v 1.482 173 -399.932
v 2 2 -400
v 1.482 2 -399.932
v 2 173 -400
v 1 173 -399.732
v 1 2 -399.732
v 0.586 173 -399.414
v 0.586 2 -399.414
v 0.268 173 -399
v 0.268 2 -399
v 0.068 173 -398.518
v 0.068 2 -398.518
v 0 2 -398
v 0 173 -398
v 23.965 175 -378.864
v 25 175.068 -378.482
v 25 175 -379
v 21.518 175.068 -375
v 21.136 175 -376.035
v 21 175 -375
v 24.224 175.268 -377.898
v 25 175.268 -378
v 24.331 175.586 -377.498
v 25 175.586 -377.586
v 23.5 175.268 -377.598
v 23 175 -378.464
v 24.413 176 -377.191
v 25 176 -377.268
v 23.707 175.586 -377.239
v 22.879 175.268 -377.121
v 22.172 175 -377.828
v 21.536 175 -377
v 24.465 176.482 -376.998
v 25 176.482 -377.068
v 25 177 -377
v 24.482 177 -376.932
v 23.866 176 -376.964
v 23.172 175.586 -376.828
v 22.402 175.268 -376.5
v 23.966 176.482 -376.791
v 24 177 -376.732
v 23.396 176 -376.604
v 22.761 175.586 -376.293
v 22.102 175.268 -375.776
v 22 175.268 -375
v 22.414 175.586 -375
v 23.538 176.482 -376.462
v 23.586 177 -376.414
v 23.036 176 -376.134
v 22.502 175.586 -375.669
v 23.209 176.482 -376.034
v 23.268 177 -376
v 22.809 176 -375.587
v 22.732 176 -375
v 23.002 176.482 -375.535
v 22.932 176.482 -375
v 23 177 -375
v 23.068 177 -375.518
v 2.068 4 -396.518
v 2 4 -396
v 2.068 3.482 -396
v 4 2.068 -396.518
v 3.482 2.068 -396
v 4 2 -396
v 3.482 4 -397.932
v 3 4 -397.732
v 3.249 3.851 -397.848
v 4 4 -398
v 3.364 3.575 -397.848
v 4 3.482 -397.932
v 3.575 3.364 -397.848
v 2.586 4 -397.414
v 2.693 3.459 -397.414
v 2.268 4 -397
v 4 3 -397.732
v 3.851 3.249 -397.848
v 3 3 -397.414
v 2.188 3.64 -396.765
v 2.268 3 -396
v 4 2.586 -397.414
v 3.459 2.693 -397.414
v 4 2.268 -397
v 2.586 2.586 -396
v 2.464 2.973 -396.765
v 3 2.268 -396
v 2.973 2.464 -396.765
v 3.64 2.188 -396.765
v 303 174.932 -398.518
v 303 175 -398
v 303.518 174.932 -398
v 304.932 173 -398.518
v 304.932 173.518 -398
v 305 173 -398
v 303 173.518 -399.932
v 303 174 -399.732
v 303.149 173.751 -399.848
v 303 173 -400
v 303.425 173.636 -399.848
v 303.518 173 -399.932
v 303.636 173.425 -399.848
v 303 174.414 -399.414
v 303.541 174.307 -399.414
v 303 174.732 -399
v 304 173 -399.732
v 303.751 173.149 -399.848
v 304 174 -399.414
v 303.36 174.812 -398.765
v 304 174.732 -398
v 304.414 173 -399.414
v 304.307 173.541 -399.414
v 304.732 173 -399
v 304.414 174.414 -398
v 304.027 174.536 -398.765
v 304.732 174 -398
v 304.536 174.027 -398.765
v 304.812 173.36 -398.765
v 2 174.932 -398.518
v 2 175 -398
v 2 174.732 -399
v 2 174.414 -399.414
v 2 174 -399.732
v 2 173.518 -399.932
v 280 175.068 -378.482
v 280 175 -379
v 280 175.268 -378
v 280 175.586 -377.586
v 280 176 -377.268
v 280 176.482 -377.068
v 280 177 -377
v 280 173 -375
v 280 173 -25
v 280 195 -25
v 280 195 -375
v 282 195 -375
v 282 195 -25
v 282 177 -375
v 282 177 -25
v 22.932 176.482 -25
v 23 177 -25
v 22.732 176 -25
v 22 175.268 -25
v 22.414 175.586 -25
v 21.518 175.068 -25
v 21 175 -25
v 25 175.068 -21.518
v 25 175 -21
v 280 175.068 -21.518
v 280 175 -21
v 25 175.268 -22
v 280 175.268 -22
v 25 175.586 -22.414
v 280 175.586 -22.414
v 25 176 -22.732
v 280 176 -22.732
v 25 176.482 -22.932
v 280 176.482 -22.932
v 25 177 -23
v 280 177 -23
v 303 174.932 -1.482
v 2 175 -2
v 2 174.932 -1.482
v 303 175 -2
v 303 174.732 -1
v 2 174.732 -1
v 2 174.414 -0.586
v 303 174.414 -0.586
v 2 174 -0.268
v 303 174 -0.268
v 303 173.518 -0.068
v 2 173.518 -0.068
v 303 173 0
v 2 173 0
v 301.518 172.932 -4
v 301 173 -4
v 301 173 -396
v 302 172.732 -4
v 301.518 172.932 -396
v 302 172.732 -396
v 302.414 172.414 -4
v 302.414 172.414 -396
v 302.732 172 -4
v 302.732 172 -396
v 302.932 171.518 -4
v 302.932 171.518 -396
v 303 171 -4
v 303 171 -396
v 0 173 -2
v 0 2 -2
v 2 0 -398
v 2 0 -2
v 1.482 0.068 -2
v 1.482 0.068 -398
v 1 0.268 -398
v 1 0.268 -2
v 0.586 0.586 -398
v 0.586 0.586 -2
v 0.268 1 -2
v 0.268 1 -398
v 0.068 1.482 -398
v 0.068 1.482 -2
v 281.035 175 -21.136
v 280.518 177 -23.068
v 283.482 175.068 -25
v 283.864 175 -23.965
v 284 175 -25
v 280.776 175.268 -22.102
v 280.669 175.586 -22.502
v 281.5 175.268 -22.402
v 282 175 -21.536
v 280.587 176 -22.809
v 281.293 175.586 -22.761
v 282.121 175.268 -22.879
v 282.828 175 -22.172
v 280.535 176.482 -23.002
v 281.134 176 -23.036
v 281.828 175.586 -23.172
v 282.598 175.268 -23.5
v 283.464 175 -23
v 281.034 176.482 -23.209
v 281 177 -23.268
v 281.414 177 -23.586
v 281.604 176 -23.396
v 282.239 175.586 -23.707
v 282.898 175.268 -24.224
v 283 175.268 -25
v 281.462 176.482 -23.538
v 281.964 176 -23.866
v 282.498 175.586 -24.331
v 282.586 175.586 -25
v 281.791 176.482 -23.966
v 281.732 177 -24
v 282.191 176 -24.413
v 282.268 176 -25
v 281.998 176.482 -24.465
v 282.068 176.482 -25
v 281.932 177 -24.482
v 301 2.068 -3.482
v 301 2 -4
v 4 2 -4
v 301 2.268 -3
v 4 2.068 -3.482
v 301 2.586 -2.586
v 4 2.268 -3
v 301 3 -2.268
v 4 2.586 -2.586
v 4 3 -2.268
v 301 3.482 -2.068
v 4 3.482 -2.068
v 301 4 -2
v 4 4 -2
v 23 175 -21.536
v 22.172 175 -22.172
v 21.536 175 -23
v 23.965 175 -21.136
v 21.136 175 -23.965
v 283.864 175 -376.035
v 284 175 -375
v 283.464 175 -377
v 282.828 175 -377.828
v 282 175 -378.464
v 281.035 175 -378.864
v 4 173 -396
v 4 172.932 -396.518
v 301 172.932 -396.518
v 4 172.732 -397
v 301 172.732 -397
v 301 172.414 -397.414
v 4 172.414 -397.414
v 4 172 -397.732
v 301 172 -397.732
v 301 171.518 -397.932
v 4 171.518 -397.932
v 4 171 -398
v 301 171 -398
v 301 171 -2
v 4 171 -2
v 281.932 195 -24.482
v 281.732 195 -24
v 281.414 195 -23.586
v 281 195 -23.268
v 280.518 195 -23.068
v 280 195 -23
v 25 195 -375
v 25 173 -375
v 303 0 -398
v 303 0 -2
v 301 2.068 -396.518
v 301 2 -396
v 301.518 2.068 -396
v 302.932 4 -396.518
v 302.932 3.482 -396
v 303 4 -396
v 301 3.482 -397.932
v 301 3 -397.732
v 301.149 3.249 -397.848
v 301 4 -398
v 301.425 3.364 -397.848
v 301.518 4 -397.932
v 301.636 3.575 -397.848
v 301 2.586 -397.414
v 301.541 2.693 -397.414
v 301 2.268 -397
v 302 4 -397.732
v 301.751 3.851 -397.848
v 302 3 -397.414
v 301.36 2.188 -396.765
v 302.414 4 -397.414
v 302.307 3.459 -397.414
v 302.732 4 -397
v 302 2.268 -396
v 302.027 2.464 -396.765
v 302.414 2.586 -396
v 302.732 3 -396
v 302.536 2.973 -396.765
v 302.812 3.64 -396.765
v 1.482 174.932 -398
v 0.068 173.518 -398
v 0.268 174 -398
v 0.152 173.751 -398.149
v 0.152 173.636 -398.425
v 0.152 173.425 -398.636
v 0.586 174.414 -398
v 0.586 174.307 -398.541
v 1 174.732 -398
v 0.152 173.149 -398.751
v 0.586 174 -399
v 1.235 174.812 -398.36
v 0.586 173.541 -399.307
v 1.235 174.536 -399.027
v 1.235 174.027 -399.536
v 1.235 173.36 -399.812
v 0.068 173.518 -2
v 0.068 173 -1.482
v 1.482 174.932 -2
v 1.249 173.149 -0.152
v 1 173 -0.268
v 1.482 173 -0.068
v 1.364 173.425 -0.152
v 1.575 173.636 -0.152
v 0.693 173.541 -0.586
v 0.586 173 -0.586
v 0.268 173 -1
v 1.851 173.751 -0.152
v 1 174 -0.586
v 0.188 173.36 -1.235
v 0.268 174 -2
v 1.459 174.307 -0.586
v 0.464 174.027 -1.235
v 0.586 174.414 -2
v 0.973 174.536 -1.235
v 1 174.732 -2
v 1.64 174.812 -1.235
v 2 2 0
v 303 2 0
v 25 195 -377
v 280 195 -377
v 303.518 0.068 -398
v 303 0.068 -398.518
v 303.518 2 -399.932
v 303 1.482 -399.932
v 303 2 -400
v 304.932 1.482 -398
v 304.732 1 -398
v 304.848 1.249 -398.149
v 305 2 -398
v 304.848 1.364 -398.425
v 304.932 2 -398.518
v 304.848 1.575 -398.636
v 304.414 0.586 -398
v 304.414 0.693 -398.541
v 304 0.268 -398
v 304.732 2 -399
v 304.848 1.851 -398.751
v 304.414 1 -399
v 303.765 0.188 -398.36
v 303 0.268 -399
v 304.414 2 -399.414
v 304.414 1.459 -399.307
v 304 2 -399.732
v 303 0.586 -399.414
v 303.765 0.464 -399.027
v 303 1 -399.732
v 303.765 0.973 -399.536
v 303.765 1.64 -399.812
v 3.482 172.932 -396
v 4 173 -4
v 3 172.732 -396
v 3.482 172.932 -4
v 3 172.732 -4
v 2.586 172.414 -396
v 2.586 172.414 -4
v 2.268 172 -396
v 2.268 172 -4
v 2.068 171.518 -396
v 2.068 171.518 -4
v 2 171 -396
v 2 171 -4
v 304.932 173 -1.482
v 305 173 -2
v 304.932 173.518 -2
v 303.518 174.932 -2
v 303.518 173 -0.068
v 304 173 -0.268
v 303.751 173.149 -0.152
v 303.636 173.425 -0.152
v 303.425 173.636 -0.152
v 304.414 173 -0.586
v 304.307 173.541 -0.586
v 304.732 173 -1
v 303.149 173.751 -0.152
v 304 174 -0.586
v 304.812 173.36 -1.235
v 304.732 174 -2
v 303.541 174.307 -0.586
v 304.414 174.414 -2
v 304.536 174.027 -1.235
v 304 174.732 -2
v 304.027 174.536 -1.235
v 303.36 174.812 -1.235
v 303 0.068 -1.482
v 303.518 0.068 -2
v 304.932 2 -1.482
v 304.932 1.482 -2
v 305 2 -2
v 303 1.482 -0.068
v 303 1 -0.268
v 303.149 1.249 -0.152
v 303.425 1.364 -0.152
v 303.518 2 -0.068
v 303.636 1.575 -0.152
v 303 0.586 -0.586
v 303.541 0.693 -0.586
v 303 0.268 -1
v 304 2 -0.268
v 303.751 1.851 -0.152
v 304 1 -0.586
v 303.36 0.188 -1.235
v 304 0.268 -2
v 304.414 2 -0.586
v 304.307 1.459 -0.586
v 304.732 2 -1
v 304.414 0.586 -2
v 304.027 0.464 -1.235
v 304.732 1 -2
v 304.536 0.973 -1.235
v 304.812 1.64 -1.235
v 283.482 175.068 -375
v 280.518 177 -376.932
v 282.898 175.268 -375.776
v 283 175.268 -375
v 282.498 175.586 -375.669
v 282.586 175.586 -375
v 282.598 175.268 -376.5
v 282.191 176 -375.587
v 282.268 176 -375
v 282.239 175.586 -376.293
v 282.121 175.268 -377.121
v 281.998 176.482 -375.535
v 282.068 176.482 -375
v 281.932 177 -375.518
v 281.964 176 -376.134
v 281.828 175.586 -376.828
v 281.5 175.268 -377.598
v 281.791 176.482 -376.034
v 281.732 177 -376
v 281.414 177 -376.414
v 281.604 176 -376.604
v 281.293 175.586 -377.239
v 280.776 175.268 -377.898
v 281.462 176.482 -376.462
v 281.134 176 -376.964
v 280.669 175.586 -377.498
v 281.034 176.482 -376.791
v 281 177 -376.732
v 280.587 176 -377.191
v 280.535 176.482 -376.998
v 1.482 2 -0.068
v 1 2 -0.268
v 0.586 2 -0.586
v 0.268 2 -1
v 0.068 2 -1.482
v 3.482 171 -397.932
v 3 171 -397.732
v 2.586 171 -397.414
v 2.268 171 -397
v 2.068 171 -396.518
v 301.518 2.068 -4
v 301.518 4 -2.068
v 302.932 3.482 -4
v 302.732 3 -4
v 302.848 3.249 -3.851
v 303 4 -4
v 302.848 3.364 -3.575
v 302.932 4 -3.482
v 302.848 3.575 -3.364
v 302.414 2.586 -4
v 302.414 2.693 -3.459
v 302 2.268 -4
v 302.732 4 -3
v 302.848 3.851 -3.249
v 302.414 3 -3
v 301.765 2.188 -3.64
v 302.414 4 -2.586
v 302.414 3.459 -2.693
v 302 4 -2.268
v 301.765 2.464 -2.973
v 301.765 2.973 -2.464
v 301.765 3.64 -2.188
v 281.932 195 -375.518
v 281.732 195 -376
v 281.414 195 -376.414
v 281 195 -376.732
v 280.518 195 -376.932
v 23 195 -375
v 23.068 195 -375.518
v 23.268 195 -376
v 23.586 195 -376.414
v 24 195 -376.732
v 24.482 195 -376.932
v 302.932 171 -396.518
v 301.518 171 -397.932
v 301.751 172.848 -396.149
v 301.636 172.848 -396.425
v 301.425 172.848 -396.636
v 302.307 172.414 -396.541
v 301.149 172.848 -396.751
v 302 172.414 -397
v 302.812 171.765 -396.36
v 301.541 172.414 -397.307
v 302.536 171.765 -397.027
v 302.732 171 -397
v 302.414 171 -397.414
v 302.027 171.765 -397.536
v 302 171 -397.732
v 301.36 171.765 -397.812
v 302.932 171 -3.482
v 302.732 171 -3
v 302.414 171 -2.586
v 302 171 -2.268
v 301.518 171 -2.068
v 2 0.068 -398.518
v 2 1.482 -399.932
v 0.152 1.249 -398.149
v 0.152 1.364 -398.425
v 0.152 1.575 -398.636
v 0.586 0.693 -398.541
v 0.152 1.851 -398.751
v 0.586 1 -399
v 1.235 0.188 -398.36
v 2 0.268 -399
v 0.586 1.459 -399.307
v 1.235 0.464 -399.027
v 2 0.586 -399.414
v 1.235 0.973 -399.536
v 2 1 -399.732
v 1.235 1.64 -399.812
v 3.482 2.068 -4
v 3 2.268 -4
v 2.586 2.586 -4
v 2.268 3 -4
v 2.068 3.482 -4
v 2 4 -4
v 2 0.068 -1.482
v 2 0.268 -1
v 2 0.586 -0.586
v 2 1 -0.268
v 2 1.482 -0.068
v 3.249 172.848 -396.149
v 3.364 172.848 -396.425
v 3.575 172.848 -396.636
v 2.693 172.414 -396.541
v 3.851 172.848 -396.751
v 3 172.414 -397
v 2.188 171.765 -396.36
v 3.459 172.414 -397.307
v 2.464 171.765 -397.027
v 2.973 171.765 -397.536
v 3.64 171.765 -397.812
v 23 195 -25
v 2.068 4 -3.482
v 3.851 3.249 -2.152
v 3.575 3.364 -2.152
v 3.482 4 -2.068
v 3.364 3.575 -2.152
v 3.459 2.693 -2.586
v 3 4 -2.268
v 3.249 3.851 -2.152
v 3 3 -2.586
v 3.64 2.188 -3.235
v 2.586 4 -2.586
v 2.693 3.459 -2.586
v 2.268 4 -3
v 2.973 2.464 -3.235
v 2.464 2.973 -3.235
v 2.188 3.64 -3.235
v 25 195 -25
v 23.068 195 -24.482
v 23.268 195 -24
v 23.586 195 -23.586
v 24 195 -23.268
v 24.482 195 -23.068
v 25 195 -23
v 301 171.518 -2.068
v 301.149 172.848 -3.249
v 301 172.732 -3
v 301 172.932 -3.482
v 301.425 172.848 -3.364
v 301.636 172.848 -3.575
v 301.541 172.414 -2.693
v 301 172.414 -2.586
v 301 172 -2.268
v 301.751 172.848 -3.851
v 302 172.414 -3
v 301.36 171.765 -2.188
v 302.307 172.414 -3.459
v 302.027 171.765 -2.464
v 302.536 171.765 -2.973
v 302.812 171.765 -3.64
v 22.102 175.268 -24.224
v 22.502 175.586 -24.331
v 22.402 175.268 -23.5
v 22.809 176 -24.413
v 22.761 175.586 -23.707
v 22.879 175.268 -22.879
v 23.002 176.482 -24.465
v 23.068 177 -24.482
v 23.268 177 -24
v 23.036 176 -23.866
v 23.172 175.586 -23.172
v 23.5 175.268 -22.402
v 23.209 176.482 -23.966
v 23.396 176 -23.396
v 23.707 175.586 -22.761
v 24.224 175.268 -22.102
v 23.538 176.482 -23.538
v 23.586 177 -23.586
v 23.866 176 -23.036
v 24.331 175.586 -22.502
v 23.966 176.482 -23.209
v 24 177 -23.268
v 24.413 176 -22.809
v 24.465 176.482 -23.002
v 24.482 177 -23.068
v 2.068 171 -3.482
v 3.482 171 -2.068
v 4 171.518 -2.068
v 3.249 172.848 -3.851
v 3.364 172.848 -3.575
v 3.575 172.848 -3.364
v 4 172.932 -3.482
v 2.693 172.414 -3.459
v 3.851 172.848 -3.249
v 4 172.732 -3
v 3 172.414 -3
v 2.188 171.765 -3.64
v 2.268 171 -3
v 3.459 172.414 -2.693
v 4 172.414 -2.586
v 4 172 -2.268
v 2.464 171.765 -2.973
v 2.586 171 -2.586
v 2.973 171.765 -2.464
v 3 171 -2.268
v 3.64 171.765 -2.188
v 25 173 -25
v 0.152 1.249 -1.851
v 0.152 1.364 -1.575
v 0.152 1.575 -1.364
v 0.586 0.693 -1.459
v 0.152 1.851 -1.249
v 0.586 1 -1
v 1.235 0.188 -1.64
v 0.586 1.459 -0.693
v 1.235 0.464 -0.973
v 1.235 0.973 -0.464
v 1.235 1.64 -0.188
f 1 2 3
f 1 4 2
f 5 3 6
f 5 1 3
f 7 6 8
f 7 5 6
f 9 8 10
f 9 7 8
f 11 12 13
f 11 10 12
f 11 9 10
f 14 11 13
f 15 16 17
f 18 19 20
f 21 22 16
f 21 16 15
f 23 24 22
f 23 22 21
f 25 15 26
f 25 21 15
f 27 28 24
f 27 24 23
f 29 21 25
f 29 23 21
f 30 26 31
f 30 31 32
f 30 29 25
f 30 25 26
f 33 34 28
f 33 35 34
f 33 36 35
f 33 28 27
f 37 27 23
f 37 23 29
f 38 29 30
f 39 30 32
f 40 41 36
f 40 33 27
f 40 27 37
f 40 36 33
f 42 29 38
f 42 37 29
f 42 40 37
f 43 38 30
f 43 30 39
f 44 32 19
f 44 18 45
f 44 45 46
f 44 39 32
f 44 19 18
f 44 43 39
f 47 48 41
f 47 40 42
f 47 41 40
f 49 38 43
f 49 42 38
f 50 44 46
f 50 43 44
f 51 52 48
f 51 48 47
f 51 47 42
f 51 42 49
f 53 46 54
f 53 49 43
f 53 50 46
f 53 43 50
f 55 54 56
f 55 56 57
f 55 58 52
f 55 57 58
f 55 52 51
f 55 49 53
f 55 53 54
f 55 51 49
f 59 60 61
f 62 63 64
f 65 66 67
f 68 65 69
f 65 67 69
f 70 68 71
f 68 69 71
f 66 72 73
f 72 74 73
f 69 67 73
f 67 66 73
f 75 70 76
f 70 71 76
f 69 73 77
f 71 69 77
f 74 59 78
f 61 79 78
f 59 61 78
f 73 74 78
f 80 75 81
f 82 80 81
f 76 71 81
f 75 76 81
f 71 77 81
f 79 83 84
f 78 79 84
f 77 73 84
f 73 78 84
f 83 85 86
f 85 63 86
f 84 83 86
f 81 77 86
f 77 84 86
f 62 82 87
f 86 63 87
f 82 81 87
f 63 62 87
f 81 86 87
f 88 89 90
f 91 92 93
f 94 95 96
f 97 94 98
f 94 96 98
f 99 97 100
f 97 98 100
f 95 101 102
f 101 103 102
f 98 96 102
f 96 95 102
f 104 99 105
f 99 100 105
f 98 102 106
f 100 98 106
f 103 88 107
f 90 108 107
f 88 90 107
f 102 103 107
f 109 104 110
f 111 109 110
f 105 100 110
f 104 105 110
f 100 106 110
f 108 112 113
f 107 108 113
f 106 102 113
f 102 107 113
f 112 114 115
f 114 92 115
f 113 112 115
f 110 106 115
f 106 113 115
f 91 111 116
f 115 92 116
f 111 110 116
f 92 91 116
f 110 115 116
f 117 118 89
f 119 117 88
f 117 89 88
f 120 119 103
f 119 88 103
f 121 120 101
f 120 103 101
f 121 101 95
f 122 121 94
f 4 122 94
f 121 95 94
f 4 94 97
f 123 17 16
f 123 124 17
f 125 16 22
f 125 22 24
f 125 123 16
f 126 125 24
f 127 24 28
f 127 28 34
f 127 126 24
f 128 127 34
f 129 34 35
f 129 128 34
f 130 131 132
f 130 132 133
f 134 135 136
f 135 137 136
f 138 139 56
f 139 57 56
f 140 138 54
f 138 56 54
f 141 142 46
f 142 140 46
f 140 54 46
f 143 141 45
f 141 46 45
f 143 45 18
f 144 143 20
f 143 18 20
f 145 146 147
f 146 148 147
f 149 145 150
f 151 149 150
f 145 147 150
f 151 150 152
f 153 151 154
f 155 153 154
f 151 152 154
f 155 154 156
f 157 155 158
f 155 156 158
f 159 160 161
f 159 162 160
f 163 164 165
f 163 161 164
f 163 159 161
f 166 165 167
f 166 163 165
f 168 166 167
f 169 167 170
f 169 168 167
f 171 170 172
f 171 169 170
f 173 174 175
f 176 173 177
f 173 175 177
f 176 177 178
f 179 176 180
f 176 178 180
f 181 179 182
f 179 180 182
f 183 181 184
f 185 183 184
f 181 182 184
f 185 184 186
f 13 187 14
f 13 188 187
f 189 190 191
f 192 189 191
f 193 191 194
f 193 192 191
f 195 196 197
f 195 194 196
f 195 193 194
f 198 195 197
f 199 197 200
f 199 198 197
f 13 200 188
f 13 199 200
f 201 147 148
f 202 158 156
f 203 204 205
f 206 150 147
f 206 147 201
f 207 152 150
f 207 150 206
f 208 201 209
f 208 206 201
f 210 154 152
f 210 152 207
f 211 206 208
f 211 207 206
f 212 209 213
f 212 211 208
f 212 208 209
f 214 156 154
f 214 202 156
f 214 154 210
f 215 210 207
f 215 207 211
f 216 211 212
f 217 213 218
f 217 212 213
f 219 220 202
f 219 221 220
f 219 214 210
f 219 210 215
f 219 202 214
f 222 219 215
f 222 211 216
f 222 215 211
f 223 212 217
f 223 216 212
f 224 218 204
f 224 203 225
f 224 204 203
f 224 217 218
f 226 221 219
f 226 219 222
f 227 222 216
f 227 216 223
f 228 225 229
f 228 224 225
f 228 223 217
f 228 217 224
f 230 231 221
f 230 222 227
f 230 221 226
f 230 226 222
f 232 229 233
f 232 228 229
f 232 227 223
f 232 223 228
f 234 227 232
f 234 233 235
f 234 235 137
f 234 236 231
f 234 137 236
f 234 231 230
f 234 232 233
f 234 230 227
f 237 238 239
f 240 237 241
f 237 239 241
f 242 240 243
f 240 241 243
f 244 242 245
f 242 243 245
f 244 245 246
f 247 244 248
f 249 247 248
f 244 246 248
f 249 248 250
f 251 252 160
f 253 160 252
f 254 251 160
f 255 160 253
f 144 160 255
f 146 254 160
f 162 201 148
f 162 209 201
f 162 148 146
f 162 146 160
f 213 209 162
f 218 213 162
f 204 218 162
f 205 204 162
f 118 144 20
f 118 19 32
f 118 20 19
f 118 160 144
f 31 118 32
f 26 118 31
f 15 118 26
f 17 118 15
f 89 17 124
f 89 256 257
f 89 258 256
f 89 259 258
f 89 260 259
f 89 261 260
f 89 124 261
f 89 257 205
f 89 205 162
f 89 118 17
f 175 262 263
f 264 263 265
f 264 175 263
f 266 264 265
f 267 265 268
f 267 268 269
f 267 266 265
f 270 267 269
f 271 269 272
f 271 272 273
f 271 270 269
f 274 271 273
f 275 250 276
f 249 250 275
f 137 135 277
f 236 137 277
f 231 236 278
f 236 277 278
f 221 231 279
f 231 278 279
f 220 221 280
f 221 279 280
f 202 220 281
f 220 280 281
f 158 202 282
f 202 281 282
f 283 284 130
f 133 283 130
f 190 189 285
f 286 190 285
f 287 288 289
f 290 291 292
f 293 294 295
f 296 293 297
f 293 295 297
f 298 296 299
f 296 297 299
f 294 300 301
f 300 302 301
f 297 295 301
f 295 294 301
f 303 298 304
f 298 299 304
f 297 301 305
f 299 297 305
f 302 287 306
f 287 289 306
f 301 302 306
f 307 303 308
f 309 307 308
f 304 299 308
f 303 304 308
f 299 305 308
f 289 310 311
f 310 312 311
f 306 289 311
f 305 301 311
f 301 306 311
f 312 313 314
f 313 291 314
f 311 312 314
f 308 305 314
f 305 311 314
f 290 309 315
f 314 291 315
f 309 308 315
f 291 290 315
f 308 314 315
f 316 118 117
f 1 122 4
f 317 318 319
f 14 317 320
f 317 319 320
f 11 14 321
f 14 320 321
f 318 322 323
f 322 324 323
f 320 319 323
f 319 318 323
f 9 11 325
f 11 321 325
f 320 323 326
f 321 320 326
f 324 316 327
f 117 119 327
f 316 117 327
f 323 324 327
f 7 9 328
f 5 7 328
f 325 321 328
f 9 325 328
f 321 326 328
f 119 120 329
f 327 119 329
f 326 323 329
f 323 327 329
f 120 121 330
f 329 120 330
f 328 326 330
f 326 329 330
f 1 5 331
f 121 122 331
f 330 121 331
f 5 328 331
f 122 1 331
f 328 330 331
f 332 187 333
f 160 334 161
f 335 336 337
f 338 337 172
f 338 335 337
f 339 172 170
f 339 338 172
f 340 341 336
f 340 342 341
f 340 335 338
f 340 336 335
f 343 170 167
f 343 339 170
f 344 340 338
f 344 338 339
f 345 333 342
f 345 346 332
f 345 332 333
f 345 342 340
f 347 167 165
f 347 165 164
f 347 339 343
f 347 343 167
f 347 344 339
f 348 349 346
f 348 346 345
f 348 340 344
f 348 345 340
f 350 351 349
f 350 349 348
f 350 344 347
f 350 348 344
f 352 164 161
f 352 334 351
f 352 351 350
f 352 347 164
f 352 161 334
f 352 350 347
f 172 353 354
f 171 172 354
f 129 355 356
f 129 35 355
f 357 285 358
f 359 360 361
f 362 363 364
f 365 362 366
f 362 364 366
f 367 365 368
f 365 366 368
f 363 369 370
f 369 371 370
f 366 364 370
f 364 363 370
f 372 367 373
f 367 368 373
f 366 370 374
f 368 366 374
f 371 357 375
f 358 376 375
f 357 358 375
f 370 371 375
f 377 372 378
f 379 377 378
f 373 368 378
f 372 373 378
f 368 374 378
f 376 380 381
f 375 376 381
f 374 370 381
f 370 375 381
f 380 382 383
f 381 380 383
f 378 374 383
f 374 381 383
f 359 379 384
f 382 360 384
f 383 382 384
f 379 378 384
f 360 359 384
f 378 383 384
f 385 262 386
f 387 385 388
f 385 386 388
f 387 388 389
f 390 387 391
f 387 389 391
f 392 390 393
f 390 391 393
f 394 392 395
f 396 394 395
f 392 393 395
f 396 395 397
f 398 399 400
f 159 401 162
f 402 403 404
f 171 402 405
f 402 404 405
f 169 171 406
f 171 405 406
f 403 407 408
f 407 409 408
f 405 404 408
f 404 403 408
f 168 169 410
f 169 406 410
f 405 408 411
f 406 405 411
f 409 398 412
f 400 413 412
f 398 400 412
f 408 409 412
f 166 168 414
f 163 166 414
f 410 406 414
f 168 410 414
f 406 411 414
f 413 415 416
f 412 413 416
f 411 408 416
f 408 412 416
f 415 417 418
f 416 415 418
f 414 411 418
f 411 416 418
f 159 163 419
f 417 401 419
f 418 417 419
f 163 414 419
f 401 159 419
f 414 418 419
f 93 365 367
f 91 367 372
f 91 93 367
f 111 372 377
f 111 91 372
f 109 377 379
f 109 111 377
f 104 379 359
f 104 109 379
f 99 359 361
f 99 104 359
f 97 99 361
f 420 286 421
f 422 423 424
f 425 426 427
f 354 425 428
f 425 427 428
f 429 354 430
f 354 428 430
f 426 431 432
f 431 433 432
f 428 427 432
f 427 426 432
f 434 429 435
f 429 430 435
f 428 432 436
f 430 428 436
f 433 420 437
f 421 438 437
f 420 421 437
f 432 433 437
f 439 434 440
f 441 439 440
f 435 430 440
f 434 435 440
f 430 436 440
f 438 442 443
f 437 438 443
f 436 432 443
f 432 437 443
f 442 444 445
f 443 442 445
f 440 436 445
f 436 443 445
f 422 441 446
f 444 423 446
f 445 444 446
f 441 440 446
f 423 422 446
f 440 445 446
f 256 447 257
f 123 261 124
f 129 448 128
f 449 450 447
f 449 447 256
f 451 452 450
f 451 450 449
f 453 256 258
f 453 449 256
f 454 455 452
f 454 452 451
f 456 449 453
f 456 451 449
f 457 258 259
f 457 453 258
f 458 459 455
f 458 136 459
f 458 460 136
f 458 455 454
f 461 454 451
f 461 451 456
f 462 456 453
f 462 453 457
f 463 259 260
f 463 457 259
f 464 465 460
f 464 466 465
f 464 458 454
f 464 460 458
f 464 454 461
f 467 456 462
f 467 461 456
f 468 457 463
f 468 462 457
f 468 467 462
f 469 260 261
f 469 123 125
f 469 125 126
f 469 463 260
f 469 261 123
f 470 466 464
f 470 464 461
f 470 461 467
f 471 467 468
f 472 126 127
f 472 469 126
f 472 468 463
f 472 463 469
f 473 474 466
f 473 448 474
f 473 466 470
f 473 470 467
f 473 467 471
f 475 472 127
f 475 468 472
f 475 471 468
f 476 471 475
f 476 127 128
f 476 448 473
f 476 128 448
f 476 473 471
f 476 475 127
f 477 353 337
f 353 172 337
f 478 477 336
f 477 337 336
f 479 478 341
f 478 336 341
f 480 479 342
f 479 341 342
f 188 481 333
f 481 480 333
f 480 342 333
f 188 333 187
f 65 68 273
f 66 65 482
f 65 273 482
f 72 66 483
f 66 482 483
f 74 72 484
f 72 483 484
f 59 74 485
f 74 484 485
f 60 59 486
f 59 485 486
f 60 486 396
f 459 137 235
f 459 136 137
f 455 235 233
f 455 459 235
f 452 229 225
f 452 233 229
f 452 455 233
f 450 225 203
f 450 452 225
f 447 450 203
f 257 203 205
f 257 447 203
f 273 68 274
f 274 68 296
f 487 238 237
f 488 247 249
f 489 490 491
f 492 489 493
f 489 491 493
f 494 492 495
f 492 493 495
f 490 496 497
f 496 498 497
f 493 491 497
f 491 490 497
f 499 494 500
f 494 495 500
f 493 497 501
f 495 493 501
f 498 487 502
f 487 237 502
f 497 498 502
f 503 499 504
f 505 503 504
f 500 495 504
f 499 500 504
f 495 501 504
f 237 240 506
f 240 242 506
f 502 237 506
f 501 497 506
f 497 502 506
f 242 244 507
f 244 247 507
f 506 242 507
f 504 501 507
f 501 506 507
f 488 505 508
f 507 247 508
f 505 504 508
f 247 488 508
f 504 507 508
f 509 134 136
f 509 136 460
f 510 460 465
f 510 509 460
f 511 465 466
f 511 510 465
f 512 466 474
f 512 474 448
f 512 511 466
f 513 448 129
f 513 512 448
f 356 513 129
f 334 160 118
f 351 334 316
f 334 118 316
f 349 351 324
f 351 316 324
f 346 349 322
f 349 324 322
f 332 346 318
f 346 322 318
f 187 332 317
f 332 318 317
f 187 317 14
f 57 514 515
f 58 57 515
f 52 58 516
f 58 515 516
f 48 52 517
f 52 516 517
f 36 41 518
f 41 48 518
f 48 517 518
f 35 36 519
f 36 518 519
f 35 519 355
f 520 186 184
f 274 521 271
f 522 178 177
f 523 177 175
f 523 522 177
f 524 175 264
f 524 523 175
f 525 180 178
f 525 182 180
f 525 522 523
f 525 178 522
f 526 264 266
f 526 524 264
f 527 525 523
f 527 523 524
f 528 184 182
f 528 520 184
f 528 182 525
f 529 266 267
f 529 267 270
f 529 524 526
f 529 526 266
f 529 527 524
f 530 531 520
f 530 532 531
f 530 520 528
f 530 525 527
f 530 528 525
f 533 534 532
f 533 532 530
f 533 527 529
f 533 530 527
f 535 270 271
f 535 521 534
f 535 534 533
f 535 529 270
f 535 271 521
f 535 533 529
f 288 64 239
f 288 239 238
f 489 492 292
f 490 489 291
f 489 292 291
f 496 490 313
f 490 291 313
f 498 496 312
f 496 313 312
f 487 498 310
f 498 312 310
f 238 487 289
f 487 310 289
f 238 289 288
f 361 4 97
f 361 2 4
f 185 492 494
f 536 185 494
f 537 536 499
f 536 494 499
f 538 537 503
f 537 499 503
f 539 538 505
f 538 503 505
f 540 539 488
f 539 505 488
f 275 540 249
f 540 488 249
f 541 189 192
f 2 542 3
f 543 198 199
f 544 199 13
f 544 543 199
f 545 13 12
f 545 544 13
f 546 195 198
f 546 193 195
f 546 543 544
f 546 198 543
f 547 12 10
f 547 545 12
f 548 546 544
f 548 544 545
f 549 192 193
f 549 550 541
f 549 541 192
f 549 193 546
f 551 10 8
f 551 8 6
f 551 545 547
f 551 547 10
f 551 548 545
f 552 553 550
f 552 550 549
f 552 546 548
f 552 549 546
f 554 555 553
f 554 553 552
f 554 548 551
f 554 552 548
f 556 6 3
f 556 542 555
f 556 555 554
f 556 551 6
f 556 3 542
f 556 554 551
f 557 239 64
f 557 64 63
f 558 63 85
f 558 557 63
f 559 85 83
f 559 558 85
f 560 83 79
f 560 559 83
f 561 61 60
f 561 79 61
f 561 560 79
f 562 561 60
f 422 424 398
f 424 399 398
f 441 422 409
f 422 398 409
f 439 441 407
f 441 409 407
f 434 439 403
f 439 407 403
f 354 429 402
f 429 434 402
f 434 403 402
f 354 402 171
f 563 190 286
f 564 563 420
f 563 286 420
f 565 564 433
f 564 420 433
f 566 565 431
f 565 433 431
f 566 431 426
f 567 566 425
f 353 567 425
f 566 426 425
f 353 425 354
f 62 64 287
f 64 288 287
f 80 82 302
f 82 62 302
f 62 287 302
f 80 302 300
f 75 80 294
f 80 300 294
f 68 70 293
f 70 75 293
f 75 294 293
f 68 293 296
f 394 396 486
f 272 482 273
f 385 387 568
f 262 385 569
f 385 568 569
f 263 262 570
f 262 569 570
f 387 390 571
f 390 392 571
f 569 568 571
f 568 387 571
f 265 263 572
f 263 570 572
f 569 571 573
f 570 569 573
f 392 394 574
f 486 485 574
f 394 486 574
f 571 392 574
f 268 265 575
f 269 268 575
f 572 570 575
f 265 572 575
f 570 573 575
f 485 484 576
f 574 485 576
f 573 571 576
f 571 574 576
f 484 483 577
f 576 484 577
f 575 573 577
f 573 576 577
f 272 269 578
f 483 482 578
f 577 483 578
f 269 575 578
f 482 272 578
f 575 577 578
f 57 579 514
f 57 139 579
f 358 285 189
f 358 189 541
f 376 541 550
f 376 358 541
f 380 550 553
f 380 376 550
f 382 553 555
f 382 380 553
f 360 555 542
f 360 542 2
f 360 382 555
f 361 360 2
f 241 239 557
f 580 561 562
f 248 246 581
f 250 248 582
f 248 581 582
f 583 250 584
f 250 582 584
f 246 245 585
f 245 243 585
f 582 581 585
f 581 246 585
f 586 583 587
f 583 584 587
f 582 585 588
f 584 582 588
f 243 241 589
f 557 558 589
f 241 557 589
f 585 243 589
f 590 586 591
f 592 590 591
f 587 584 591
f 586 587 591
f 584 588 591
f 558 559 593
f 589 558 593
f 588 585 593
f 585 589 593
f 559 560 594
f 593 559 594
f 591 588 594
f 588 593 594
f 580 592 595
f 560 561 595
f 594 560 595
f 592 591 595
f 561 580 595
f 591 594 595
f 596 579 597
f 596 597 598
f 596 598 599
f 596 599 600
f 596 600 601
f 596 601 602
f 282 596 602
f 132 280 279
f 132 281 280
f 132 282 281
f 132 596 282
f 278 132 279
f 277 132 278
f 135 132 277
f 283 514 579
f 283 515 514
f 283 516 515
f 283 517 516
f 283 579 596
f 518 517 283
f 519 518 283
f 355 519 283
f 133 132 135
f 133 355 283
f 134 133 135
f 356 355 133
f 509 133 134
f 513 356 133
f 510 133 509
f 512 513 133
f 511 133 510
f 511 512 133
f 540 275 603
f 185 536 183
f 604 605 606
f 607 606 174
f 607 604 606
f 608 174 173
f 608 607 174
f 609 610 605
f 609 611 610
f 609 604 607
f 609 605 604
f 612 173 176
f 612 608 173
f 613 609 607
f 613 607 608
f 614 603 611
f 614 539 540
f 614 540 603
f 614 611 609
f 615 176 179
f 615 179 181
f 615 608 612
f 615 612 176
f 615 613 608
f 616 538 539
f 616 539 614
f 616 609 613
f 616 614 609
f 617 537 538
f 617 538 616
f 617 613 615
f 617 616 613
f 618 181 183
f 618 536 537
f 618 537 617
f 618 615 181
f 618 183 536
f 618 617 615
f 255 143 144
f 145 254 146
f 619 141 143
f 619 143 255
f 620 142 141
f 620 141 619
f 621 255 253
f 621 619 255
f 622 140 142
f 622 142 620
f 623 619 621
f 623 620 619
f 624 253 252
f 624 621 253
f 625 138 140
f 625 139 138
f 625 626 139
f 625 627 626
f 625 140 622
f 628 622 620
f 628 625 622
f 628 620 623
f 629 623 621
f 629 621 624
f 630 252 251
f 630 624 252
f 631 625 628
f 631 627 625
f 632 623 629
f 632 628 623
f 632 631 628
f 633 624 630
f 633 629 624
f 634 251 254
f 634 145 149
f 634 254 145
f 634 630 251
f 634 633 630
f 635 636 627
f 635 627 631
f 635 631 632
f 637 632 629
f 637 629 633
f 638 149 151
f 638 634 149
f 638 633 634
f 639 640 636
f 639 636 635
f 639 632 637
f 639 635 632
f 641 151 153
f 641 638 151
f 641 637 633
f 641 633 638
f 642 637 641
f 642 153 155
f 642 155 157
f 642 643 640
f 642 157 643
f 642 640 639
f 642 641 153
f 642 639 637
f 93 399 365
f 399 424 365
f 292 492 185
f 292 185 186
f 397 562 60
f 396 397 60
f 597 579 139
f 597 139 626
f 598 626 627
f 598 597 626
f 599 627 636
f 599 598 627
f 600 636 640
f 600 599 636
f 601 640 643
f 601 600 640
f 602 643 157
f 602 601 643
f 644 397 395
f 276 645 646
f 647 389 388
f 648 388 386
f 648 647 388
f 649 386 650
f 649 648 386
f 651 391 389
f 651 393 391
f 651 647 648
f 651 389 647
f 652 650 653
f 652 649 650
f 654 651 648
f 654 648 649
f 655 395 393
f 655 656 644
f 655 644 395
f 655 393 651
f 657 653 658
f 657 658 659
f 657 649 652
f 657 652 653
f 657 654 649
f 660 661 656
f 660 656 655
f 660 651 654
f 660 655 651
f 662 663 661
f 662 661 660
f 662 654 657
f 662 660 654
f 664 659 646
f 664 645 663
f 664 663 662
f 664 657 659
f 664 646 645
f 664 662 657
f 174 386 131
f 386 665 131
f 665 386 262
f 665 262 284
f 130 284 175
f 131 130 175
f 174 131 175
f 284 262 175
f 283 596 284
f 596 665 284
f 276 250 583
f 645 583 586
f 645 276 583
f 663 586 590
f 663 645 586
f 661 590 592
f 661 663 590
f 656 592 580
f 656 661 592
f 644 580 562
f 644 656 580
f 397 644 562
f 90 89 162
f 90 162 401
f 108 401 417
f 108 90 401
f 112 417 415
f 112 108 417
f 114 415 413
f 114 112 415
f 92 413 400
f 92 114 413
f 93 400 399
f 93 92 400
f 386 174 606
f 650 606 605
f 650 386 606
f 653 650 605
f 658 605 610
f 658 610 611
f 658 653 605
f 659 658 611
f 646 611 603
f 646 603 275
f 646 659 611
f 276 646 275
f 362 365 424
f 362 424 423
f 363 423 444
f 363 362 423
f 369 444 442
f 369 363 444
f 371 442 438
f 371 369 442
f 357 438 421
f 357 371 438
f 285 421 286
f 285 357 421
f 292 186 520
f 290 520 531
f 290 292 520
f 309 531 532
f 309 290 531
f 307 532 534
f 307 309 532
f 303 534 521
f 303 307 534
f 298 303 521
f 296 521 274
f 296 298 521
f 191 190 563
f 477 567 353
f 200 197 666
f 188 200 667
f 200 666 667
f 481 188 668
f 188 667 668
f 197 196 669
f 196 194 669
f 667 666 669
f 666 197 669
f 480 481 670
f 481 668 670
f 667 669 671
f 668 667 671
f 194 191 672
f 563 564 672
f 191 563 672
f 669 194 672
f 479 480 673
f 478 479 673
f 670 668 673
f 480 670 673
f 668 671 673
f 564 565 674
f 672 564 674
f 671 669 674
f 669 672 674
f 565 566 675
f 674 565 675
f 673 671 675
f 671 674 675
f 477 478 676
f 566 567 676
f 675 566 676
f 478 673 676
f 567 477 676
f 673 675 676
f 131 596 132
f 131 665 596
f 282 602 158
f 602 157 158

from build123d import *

# Parameters (mm, degrees)
SKETCH1_W           = 305
SKETCH1_H           = 400
BOSS_EXTRUDE1_DEPTH = 175
SHELL1_T            = 2
SKETCH2_W           = 255
SKETCH2_H           = 350
CUT_EXTRUDE1_DEPTH  = 5
SKETCH3_W           = 259
SKETCH3_H           = 354
SKETCH3_W_2         = 255
SKETCH3_H_2         = 350
BOSS_EXTRUDE2_DEPTH = 20
FILLET1_R           = 2


with BuildPart() as part:
    # Sketch1 → Boss-Extrude1 (new body)
    with BuildSketch(Plane(origin=(0, 0, 0), x_dir=(1, 0, 0), z_dir=(0, 1, 0))):
        with Locations((152.5, 200)):
            Rectangle(SKETCH1_W, SKETCH1_H)
    extrude(amount=BOSS_EXTRUDE1_DEPTH)

    # Shell1 (no face opened: a closed hollow body)
    add(offset(amount=-SHELL1_T, mode=Mode.PRIVATE), mode=Mode.SUBTRACT)

    # Sketch2 → Cut-Extrude1 (cut)
    with BuildSketch(Plane(origin=(0, 175, 0), x_dir=(1, 0, 0), z_dir=(0, 1, 0))):
        with Locations((152.5, 200)):
            Rectangle(SKETCH2_W, SKETCH2_H)
    extrude(amount=-CUT_EXTRUDE1_DEPTH, mode=Mode.SUBTRACT)

    # Sketch3 → Boss-Extrude2 (add)
    with BuildSketch(Plane(origin=(0, 175, 0), x_dir=(1, 0, 0), z_dir=(0, 1, 0))):
        with Locations((152.5, 200)):
            Rectangle(SKETCH3_W, SKETCH3_H)
        with Locations((152.5, 200)):
            Rectangle(SKETCH3_W_2, SKETCH3_H_2, mode=Mode.SUBTRACT)
    extrude(amount=BOSS_EXTRUDE2_DEPTH)

    # Fillet1
    fillet1_edges = [part.edges().sort_by_distance(p)[0] for p in [
        (305, 175, -200),
        (2, 2, -200),
        (2, 87.5, -398),
        (152.5, 2, -2),
        (2, 87.5, -2),
        (303, 2, -200),
        (303, 87.5, -2),
        (152.5, 2, -398),
        (303, 87.5, -398),
        (2, 173, -200),
        (152.5, 173, -2),
        (303, 173, -200),
        (152.5, 173, -398),
        (152.5, 175, -400),
        (23, 175, -200),
        (0, 175, -200),
        (152.5, 0, -400),
        (23, 185, -377),
        (152.5, 175, -23),
        (23, 185, -23),
        (282, 175, -200),
        (282, 185, -23),
        (152.5, 175, -377),
        (282, 185, -377),
        (305, 0, -200),
        (152.5, 0, 0),
        (0, 0, -200),
        (0, 87.5, -400),
        (305, 87.5, -400),
        (305, 87.5, 0),
        (0, 87.5, 0),
        (152.5, 175, 0),
    ]]
    fillet(fillet1_edges, radius=FILLET1_R)


solid = part.part
